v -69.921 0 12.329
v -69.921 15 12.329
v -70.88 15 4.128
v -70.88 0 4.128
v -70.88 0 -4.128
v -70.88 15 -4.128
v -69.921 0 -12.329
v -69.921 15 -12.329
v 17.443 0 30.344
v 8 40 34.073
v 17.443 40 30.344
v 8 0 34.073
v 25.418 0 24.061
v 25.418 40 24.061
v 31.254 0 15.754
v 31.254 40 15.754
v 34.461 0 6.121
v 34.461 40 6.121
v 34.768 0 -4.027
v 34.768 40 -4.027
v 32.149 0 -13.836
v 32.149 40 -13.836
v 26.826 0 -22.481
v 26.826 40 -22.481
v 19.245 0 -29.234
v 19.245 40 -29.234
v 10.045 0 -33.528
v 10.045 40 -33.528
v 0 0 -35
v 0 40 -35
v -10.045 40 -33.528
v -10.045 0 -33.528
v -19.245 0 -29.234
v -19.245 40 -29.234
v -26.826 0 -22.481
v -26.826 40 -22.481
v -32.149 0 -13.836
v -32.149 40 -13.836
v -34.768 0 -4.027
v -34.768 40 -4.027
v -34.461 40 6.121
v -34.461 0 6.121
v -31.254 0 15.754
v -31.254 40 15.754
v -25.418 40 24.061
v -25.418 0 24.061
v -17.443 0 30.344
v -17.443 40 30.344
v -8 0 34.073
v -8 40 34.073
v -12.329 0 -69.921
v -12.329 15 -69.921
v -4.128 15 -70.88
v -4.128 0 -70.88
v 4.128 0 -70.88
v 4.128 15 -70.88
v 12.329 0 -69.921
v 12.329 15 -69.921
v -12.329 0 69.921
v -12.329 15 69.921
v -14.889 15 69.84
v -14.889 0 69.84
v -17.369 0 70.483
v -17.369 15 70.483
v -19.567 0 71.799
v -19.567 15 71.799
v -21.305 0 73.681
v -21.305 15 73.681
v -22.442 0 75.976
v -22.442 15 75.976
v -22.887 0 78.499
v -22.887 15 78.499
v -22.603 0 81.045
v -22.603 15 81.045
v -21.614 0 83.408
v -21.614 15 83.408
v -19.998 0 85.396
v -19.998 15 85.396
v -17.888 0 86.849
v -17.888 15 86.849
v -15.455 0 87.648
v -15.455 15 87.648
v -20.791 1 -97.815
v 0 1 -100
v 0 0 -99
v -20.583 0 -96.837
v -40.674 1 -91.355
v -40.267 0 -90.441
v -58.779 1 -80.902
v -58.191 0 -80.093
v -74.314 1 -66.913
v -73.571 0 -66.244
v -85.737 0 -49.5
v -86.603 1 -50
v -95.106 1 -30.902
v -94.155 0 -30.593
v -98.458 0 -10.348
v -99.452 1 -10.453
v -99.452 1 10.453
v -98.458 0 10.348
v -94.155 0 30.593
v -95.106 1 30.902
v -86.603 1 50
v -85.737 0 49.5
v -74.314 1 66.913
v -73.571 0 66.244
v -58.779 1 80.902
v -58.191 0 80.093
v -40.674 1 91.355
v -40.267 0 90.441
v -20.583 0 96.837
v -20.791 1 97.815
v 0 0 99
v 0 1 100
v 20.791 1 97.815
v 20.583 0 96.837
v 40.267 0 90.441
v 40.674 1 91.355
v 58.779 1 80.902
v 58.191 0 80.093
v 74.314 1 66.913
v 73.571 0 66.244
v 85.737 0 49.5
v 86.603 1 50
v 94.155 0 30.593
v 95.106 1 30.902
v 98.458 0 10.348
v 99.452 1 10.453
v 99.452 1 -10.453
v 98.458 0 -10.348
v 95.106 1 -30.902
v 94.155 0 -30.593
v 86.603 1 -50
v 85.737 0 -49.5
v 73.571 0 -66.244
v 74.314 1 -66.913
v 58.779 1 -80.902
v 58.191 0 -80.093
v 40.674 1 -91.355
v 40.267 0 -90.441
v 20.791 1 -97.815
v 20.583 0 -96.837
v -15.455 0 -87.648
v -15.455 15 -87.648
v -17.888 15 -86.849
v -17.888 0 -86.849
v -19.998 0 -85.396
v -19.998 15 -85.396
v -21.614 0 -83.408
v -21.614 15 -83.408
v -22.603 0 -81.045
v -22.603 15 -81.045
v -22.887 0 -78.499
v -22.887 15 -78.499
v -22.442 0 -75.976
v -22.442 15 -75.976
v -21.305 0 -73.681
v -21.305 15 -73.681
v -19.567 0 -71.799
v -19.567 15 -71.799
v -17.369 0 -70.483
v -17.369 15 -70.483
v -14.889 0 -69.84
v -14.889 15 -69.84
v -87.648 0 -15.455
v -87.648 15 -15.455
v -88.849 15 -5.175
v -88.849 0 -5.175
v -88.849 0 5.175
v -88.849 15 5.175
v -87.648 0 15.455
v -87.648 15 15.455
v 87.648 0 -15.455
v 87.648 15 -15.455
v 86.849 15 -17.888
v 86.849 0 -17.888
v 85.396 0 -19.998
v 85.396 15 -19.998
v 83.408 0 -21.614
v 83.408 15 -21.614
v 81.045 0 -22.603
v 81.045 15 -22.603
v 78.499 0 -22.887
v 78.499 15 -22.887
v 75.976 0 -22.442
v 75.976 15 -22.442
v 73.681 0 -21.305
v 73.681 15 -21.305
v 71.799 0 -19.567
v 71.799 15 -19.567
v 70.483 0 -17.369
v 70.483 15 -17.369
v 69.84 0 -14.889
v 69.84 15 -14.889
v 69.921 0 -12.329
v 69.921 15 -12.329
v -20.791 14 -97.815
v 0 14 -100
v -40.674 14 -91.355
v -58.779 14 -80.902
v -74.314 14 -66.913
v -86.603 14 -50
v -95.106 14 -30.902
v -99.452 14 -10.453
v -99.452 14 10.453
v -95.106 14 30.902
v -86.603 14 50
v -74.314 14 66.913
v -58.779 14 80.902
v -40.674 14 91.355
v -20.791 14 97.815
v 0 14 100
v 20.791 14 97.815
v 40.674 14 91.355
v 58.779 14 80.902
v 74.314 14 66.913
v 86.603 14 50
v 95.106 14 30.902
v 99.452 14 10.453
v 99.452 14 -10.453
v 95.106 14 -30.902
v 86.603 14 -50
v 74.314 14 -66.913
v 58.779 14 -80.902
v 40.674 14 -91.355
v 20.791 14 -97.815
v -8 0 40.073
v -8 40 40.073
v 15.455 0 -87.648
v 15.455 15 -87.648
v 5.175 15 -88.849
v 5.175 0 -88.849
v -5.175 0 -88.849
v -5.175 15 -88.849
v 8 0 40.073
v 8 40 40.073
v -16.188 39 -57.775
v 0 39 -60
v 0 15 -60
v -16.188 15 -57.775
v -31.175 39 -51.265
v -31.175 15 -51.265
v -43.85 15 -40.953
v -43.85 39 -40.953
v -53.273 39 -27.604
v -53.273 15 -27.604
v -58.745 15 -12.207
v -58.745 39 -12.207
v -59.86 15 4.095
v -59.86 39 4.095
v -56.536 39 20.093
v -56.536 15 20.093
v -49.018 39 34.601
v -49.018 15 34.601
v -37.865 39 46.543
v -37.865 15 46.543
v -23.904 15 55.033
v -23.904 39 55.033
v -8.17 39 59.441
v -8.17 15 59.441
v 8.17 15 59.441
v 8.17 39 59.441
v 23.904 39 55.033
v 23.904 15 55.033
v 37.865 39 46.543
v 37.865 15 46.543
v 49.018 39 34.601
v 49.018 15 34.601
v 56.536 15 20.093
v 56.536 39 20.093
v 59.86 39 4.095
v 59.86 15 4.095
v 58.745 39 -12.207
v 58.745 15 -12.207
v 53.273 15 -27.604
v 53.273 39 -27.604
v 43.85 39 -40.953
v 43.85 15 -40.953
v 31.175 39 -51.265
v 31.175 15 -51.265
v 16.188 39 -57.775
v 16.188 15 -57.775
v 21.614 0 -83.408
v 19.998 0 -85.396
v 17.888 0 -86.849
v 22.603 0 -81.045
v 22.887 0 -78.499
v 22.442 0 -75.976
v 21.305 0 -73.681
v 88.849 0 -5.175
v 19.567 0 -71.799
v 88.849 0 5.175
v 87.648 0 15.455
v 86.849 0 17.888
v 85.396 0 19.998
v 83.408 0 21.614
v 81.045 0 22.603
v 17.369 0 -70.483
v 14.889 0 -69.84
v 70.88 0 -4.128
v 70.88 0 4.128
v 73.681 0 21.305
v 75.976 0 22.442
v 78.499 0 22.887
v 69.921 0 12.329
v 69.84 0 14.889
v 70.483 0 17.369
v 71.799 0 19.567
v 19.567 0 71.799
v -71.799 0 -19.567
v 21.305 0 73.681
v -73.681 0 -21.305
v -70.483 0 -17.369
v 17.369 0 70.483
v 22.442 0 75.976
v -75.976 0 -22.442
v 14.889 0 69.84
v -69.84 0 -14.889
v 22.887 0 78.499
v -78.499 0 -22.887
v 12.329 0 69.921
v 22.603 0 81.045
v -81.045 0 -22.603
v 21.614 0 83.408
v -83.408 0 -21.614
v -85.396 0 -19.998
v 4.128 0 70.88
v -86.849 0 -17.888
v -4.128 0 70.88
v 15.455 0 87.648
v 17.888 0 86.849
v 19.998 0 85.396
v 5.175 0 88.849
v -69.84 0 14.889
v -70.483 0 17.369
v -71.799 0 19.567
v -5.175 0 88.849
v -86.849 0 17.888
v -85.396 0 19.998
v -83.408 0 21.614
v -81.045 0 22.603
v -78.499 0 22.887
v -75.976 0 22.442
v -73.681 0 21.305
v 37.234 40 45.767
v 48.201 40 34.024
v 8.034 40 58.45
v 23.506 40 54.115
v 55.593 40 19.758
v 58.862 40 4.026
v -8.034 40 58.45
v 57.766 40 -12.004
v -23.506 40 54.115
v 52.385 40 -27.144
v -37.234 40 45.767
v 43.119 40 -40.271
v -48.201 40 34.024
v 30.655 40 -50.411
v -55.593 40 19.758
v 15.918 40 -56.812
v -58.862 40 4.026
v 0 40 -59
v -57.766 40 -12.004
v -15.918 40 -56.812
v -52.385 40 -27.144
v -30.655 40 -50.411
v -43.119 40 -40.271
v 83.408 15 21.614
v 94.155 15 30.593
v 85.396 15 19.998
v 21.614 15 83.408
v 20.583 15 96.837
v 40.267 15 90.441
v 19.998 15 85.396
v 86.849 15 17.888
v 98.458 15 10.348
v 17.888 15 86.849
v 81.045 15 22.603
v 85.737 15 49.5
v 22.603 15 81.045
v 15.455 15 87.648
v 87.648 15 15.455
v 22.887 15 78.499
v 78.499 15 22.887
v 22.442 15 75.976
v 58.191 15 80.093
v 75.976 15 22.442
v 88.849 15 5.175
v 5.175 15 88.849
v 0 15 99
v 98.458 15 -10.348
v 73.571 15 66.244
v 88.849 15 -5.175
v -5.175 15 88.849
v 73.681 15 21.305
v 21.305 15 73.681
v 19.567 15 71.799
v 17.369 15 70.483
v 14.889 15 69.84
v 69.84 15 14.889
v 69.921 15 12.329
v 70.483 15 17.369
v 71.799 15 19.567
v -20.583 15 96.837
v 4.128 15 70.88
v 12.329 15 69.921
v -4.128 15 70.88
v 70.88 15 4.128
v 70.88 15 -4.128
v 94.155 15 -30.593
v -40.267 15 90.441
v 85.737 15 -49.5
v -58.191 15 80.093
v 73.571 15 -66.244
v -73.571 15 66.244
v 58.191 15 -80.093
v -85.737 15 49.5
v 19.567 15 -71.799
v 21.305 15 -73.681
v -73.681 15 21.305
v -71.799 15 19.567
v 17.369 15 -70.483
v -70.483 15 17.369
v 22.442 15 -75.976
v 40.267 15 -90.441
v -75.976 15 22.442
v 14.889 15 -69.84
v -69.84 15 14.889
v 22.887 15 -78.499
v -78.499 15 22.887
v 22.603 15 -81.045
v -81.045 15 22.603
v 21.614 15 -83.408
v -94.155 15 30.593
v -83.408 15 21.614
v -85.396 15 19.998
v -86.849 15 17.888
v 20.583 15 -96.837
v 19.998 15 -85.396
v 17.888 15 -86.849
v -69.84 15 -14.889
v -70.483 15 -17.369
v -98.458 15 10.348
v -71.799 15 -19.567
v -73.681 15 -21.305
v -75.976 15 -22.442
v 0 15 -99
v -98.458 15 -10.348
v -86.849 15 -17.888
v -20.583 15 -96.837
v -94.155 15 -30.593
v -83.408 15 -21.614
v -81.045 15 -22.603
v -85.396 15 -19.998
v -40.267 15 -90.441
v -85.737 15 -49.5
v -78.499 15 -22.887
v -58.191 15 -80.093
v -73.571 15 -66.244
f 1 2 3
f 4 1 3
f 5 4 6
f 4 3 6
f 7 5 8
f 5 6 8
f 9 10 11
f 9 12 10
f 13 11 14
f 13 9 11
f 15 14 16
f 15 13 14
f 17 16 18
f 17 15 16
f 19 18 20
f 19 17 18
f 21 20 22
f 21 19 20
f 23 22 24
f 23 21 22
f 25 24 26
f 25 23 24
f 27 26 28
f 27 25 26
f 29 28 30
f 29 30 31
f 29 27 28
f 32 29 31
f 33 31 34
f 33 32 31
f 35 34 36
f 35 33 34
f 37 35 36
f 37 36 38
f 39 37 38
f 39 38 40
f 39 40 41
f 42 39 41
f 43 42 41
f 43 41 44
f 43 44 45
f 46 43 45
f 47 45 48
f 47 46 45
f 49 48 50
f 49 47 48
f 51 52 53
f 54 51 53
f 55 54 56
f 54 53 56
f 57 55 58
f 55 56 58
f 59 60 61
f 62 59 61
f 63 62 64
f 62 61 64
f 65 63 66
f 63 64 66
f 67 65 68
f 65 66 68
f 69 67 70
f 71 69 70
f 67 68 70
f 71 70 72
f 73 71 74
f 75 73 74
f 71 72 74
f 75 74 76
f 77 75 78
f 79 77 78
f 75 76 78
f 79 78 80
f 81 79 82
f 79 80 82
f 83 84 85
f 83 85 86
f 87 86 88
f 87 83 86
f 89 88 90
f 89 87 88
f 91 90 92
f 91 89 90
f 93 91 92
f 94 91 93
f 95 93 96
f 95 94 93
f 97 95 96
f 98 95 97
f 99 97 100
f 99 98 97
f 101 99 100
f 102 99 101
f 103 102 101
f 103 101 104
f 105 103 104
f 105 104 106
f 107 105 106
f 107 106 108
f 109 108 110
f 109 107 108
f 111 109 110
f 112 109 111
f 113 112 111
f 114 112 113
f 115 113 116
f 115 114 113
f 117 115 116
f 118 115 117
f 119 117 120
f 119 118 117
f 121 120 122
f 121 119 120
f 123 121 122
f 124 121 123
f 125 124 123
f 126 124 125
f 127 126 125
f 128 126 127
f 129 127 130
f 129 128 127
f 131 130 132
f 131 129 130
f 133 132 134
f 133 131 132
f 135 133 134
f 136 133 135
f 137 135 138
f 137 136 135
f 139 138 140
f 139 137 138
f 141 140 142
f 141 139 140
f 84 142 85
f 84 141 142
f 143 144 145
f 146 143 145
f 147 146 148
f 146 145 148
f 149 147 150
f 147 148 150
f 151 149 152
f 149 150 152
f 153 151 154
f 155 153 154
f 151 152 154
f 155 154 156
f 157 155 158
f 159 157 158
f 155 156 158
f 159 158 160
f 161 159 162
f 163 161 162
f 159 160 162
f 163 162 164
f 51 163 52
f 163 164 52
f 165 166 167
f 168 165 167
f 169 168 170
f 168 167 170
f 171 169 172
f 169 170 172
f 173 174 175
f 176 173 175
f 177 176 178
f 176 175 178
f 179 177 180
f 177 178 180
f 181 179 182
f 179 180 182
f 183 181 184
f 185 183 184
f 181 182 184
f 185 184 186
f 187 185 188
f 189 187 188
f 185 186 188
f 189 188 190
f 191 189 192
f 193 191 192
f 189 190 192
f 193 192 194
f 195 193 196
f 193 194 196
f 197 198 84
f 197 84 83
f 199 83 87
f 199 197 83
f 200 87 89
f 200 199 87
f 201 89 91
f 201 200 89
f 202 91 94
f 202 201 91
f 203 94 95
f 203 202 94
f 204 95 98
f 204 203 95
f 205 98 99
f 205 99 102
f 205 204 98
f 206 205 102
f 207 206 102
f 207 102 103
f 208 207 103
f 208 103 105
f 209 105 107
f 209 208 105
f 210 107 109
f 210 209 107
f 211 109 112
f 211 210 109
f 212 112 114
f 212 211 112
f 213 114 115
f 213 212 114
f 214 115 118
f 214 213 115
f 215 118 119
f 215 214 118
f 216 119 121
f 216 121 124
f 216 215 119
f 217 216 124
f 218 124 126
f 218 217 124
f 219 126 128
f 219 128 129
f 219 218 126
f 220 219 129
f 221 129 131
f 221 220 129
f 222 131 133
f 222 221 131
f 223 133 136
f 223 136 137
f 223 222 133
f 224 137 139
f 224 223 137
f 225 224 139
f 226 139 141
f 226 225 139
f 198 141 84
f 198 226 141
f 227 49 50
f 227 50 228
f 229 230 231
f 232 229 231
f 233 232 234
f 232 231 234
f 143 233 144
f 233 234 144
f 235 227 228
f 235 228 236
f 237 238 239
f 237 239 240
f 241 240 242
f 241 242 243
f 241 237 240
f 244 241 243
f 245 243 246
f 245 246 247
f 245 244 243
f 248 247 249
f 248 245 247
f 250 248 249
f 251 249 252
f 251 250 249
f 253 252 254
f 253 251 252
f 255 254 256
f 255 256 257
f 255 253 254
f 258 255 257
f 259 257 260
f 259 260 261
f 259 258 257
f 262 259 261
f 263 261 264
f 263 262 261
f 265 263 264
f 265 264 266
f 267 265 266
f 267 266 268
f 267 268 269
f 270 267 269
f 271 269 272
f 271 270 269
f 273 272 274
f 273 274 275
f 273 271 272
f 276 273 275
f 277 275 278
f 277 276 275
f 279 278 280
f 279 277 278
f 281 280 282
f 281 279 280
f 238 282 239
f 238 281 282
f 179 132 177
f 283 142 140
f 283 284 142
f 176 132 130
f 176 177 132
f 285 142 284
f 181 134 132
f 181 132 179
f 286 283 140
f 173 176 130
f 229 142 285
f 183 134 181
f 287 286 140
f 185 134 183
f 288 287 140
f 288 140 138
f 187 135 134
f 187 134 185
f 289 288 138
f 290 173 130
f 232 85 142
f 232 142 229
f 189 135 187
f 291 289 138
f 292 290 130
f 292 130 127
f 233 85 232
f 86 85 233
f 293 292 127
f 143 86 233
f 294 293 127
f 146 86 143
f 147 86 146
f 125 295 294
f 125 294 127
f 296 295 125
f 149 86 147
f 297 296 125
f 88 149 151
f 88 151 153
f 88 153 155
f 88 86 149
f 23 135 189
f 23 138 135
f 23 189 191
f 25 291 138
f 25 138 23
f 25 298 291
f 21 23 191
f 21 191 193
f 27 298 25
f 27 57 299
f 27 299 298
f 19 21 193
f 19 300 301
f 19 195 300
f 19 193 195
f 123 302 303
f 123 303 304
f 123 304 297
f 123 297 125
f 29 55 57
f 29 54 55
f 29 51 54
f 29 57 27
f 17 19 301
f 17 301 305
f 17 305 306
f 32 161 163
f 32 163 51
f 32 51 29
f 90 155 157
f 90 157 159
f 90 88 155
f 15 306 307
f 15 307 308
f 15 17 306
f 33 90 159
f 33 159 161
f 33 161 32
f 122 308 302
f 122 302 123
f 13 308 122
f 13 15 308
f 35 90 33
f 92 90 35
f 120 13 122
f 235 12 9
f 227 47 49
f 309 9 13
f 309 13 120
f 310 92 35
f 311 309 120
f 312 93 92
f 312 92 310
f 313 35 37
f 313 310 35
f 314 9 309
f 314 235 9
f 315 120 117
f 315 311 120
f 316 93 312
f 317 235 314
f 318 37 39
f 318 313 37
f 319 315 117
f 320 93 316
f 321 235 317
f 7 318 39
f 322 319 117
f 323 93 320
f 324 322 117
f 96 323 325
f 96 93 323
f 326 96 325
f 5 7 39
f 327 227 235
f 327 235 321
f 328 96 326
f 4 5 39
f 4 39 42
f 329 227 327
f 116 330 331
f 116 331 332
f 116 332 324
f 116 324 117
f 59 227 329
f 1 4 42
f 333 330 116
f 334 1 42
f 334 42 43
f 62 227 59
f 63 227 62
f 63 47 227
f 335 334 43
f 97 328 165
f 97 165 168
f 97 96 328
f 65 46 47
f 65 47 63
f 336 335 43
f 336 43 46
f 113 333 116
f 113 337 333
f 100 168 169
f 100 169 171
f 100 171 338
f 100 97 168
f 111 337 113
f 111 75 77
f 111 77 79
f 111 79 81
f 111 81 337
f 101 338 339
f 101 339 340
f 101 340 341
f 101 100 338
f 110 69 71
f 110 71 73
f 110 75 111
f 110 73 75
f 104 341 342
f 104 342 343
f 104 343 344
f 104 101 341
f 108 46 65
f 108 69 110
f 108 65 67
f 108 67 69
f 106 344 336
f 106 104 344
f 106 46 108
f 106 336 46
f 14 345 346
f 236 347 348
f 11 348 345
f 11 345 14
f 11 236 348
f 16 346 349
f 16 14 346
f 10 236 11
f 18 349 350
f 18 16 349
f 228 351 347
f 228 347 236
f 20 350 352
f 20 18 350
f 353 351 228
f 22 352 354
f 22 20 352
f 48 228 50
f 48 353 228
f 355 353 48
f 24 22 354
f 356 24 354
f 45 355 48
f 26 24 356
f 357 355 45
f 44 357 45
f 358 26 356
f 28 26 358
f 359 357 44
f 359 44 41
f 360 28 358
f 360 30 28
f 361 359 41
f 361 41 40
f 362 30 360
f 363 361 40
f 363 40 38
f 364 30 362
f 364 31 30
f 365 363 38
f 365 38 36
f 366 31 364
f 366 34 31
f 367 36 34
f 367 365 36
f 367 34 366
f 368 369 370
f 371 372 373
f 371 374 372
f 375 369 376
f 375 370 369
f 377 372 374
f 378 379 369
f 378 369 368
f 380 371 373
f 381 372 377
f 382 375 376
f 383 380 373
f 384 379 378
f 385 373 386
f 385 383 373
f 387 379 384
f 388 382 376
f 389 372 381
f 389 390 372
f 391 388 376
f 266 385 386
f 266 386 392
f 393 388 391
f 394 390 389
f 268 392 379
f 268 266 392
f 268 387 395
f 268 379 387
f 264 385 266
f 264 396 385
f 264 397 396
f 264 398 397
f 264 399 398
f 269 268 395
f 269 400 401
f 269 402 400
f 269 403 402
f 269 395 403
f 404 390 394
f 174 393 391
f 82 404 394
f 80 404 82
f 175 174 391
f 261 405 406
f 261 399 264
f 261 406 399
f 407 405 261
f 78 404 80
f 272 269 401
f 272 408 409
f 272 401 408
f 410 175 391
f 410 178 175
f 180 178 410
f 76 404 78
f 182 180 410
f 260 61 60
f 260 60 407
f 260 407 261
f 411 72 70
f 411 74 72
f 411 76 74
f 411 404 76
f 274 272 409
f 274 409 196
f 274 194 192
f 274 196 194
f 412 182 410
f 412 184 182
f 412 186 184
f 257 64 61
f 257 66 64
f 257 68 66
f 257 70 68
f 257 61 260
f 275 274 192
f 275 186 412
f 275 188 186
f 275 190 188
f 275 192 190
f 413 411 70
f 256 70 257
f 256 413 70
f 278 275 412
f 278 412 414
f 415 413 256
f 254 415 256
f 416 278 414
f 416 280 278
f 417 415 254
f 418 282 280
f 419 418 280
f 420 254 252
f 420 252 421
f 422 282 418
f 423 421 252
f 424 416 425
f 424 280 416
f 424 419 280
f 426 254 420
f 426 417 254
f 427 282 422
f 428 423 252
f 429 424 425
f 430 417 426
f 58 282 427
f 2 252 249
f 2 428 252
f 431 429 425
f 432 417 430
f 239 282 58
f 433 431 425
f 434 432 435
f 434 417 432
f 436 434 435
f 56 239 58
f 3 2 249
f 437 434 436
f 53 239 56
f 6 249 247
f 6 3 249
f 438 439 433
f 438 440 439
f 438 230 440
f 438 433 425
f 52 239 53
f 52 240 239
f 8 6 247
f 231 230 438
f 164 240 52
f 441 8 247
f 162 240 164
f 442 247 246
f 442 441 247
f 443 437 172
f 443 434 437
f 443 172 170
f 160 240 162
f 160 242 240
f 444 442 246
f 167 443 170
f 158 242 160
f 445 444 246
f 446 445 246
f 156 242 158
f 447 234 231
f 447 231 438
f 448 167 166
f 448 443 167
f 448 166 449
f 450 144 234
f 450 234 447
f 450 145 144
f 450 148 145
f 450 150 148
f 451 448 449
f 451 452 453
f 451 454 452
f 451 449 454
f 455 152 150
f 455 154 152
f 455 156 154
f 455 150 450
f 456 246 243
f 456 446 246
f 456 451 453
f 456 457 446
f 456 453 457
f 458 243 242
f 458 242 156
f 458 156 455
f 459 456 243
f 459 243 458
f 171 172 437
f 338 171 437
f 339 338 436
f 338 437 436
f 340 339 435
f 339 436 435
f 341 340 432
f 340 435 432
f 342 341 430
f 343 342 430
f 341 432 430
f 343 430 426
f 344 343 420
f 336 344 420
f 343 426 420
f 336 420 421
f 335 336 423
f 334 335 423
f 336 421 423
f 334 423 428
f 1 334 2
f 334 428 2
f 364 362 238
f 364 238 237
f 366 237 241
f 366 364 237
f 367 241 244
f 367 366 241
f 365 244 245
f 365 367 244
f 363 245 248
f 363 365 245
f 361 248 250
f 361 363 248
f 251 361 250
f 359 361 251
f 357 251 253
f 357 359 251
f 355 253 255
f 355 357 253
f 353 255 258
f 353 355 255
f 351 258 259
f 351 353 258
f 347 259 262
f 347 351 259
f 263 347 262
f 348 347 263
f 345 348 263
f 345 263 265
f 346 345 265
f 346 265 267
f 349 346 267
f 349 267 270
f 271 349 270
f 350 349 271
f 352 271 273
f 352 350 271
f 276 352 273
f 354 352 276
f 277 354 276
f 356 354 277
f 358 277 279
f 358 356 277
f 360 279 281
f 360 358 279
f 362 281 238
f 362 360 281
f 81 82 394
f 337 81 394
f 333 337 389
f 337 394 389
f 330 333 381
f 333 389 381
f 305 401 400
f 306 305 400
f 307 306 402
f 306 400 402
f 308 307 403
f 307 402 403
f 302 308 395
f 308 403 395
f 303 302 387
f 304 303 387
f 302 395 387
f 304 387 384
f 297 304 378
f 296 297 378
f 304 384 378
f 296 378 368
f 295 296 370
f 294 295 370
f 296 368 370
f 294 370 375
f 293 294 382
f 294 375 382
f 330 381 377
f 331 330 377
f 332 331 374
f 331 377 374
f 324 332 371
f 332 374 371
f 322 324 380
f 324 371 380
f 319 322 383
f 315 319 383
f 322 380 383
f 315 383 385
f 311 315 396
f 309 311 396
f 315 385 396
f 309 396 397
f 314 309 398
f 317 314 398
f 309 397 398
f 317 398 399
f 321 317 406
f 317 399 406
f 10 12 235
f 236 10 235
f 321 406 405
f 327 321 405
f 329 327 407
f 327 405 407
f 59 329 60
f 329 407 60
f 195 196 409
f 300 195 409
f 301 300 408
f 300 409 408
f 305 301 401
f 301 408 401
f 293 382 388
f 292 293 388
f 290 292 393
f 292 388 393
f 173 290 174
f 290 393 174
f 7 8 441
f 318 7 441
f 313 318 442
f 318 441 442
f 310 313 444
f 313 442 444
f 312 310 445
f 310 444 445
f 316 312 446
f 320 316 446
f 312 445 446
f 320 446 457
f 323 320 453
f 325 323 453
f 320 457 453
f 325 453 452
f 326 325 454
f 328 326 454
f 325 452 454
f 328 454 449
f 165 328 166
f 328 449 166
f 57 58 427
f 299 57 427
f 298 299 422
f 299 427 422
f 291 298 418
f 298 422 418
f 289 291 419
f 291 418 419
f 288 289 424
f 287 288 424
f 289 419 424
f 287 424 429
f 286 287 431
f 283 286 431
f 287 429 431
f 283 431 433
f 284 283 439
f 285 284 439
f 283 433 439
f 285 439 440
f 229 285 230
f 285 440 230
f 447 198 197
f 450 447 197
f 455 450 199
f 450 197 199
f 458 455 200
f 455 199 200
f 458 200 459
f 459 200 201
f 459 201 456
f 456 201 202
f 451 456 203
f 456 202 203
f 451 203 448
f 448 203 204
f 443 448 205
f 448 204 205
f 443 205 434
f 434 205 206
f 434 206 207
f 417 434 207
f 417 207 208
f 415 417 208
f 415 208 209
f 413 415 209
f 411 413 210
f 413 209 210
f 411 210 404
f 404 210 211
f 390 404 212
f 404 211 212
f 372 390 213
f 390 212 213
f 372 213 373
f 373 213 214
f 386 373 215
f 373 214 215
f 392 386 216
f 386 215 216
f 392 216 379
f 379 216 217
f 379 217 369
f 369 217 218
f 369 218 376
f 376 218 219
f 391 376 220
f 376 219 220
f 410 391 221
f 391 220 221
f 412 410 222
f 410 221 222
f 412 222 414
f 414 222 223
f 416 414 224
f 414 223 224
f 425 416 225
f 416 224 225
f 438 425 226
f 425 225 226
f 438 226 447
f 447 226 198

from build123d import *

# Parameters (mm, degrees)
CUT_EXTRUDE_1_DEPTH = 144.614066163
SKETCH_3_W          = 16
SKETCH_3_H          = 6
CUT_EXTRUDE_2_DEPTH = 147.969384567
CHAMFER_1_SIZE      = 1


with BuildPart() as part:
    # 草图1 → 旋转1 (revolve)
    with BuildSketch(Plane.XY, mode=Mode.PRIVATE) as revolve_1_sk:
        Polygon((35, 0), (100, 0), (100, 15), (60, 15), (60, 40), (35, 40), align=None)
    revolve(revolve_1_sk.sketch.rotate(Axis((0, 0, 0), (0, 1, 0)), 90), axis=Axis((0, 0, 0), (0, 1, 0)))

    # 草图2 → 切除-拉伸1 (cut, through all)
    with BuildSketch(Plane(origin=(0, 15, 0), x_dir=(1, 0, 0), z_dir=(0, 1, 0))):
        with BuildLine():
            ThreePointArc((15.454687812, 87.647890018), (0, 89), (-15.454687812, 87.647890018))
            ThreePointArc((-15.454687812, 87.647890018), (-22.75512399, 77.221786642), (-12.329020614, 69.921350464))
            ThreePointArc((-12.329020614, 69.921350464), (0, 71), (12.329020614, 69.921350464))
            ThreePointArc((12.329020614, 69.921350464), (22.75512399, 77.221786642), (15.454687812, 87.647890018))
        make_face()
        with BuildLine():
            ThreePointArc((69.921350464, -12.329020614), (77.221786642, -22.75512399), (87.647890018, -15.454687812))
            ThreePointArc((87.647890018, -15.454687812), (89, 0), (87.647890018, 15.454687812))
            ThreePointArc((87.647890018, 15.454687812), (77.221786642, 22.75512399), (69.921350464, 12.329020614))
            ThreePointArc((69.921350464, 12.329020614), (71, 0), (69.921350464, -12.329020614))
        make_face()
        with BuildLine():
            ThreePointArc((-12.329020614, -69.921350464), (-22.75512399, -77.221786642), (-15.454687812, -87.647890018))
            ThreePointArc((-15.454687812, -87.647890018), (0, -89), (15.454687812, -87.647890018))
            ThreePointArc((15.454687812, -87.647890018), (22.75512399, -77.221786642), (12.329020614, -69.921350464))
            ThreePointArc((12.329020614, -69.921350464), (0, -71), (-12.329020614, -69.921350464))
        make_face()
        with BuildLine():
            ThreePointArc((-69.921350464, 12.329020614), (-77.221786642, 22.75512399), (-87.647890018, 15.454687812))
            ThreePointArc((-87.647890018, 15.454687812), (-89, 0), (-87.647890018, -15.454687812))
            ThreePointArc((-87.647890018, -15.454687812), (-77.221786642, -22.75512399), (-69.921350464, -12.329020614))
            ThreePointArc((-69.921350464, -12.329020614), (-71, 0), (-69.921350464, 12.329020614))
        make_face()
    extrude(amount=-CUT_EXTRUDE_1_DEPTH, mode=Mode.SUBTRACT)

    # 草图3 → 切除-拉伸2 (cut, through all)
    with BuildSketch(Plane.XZ):
        with Locations((0, 37.073450075)):
            Rectangle(SKETCH_3_W, SKETCH_3_H)
    extrude(amount=-CUT_EXTRUDE_2_DEPTH, mode=Mode.SUBTRACT)

    # 倒角1
    chamfer_1_edges = [part.edges().sort_by_distance(p)[0] for p in [
        (0, 40, 60),
        (0, 15, 100),
        (0, 0, 100),
    ]]
    chamfer(chamfer_1_edges, length=CHAMFER_1_SIZE)


solid = part.part
